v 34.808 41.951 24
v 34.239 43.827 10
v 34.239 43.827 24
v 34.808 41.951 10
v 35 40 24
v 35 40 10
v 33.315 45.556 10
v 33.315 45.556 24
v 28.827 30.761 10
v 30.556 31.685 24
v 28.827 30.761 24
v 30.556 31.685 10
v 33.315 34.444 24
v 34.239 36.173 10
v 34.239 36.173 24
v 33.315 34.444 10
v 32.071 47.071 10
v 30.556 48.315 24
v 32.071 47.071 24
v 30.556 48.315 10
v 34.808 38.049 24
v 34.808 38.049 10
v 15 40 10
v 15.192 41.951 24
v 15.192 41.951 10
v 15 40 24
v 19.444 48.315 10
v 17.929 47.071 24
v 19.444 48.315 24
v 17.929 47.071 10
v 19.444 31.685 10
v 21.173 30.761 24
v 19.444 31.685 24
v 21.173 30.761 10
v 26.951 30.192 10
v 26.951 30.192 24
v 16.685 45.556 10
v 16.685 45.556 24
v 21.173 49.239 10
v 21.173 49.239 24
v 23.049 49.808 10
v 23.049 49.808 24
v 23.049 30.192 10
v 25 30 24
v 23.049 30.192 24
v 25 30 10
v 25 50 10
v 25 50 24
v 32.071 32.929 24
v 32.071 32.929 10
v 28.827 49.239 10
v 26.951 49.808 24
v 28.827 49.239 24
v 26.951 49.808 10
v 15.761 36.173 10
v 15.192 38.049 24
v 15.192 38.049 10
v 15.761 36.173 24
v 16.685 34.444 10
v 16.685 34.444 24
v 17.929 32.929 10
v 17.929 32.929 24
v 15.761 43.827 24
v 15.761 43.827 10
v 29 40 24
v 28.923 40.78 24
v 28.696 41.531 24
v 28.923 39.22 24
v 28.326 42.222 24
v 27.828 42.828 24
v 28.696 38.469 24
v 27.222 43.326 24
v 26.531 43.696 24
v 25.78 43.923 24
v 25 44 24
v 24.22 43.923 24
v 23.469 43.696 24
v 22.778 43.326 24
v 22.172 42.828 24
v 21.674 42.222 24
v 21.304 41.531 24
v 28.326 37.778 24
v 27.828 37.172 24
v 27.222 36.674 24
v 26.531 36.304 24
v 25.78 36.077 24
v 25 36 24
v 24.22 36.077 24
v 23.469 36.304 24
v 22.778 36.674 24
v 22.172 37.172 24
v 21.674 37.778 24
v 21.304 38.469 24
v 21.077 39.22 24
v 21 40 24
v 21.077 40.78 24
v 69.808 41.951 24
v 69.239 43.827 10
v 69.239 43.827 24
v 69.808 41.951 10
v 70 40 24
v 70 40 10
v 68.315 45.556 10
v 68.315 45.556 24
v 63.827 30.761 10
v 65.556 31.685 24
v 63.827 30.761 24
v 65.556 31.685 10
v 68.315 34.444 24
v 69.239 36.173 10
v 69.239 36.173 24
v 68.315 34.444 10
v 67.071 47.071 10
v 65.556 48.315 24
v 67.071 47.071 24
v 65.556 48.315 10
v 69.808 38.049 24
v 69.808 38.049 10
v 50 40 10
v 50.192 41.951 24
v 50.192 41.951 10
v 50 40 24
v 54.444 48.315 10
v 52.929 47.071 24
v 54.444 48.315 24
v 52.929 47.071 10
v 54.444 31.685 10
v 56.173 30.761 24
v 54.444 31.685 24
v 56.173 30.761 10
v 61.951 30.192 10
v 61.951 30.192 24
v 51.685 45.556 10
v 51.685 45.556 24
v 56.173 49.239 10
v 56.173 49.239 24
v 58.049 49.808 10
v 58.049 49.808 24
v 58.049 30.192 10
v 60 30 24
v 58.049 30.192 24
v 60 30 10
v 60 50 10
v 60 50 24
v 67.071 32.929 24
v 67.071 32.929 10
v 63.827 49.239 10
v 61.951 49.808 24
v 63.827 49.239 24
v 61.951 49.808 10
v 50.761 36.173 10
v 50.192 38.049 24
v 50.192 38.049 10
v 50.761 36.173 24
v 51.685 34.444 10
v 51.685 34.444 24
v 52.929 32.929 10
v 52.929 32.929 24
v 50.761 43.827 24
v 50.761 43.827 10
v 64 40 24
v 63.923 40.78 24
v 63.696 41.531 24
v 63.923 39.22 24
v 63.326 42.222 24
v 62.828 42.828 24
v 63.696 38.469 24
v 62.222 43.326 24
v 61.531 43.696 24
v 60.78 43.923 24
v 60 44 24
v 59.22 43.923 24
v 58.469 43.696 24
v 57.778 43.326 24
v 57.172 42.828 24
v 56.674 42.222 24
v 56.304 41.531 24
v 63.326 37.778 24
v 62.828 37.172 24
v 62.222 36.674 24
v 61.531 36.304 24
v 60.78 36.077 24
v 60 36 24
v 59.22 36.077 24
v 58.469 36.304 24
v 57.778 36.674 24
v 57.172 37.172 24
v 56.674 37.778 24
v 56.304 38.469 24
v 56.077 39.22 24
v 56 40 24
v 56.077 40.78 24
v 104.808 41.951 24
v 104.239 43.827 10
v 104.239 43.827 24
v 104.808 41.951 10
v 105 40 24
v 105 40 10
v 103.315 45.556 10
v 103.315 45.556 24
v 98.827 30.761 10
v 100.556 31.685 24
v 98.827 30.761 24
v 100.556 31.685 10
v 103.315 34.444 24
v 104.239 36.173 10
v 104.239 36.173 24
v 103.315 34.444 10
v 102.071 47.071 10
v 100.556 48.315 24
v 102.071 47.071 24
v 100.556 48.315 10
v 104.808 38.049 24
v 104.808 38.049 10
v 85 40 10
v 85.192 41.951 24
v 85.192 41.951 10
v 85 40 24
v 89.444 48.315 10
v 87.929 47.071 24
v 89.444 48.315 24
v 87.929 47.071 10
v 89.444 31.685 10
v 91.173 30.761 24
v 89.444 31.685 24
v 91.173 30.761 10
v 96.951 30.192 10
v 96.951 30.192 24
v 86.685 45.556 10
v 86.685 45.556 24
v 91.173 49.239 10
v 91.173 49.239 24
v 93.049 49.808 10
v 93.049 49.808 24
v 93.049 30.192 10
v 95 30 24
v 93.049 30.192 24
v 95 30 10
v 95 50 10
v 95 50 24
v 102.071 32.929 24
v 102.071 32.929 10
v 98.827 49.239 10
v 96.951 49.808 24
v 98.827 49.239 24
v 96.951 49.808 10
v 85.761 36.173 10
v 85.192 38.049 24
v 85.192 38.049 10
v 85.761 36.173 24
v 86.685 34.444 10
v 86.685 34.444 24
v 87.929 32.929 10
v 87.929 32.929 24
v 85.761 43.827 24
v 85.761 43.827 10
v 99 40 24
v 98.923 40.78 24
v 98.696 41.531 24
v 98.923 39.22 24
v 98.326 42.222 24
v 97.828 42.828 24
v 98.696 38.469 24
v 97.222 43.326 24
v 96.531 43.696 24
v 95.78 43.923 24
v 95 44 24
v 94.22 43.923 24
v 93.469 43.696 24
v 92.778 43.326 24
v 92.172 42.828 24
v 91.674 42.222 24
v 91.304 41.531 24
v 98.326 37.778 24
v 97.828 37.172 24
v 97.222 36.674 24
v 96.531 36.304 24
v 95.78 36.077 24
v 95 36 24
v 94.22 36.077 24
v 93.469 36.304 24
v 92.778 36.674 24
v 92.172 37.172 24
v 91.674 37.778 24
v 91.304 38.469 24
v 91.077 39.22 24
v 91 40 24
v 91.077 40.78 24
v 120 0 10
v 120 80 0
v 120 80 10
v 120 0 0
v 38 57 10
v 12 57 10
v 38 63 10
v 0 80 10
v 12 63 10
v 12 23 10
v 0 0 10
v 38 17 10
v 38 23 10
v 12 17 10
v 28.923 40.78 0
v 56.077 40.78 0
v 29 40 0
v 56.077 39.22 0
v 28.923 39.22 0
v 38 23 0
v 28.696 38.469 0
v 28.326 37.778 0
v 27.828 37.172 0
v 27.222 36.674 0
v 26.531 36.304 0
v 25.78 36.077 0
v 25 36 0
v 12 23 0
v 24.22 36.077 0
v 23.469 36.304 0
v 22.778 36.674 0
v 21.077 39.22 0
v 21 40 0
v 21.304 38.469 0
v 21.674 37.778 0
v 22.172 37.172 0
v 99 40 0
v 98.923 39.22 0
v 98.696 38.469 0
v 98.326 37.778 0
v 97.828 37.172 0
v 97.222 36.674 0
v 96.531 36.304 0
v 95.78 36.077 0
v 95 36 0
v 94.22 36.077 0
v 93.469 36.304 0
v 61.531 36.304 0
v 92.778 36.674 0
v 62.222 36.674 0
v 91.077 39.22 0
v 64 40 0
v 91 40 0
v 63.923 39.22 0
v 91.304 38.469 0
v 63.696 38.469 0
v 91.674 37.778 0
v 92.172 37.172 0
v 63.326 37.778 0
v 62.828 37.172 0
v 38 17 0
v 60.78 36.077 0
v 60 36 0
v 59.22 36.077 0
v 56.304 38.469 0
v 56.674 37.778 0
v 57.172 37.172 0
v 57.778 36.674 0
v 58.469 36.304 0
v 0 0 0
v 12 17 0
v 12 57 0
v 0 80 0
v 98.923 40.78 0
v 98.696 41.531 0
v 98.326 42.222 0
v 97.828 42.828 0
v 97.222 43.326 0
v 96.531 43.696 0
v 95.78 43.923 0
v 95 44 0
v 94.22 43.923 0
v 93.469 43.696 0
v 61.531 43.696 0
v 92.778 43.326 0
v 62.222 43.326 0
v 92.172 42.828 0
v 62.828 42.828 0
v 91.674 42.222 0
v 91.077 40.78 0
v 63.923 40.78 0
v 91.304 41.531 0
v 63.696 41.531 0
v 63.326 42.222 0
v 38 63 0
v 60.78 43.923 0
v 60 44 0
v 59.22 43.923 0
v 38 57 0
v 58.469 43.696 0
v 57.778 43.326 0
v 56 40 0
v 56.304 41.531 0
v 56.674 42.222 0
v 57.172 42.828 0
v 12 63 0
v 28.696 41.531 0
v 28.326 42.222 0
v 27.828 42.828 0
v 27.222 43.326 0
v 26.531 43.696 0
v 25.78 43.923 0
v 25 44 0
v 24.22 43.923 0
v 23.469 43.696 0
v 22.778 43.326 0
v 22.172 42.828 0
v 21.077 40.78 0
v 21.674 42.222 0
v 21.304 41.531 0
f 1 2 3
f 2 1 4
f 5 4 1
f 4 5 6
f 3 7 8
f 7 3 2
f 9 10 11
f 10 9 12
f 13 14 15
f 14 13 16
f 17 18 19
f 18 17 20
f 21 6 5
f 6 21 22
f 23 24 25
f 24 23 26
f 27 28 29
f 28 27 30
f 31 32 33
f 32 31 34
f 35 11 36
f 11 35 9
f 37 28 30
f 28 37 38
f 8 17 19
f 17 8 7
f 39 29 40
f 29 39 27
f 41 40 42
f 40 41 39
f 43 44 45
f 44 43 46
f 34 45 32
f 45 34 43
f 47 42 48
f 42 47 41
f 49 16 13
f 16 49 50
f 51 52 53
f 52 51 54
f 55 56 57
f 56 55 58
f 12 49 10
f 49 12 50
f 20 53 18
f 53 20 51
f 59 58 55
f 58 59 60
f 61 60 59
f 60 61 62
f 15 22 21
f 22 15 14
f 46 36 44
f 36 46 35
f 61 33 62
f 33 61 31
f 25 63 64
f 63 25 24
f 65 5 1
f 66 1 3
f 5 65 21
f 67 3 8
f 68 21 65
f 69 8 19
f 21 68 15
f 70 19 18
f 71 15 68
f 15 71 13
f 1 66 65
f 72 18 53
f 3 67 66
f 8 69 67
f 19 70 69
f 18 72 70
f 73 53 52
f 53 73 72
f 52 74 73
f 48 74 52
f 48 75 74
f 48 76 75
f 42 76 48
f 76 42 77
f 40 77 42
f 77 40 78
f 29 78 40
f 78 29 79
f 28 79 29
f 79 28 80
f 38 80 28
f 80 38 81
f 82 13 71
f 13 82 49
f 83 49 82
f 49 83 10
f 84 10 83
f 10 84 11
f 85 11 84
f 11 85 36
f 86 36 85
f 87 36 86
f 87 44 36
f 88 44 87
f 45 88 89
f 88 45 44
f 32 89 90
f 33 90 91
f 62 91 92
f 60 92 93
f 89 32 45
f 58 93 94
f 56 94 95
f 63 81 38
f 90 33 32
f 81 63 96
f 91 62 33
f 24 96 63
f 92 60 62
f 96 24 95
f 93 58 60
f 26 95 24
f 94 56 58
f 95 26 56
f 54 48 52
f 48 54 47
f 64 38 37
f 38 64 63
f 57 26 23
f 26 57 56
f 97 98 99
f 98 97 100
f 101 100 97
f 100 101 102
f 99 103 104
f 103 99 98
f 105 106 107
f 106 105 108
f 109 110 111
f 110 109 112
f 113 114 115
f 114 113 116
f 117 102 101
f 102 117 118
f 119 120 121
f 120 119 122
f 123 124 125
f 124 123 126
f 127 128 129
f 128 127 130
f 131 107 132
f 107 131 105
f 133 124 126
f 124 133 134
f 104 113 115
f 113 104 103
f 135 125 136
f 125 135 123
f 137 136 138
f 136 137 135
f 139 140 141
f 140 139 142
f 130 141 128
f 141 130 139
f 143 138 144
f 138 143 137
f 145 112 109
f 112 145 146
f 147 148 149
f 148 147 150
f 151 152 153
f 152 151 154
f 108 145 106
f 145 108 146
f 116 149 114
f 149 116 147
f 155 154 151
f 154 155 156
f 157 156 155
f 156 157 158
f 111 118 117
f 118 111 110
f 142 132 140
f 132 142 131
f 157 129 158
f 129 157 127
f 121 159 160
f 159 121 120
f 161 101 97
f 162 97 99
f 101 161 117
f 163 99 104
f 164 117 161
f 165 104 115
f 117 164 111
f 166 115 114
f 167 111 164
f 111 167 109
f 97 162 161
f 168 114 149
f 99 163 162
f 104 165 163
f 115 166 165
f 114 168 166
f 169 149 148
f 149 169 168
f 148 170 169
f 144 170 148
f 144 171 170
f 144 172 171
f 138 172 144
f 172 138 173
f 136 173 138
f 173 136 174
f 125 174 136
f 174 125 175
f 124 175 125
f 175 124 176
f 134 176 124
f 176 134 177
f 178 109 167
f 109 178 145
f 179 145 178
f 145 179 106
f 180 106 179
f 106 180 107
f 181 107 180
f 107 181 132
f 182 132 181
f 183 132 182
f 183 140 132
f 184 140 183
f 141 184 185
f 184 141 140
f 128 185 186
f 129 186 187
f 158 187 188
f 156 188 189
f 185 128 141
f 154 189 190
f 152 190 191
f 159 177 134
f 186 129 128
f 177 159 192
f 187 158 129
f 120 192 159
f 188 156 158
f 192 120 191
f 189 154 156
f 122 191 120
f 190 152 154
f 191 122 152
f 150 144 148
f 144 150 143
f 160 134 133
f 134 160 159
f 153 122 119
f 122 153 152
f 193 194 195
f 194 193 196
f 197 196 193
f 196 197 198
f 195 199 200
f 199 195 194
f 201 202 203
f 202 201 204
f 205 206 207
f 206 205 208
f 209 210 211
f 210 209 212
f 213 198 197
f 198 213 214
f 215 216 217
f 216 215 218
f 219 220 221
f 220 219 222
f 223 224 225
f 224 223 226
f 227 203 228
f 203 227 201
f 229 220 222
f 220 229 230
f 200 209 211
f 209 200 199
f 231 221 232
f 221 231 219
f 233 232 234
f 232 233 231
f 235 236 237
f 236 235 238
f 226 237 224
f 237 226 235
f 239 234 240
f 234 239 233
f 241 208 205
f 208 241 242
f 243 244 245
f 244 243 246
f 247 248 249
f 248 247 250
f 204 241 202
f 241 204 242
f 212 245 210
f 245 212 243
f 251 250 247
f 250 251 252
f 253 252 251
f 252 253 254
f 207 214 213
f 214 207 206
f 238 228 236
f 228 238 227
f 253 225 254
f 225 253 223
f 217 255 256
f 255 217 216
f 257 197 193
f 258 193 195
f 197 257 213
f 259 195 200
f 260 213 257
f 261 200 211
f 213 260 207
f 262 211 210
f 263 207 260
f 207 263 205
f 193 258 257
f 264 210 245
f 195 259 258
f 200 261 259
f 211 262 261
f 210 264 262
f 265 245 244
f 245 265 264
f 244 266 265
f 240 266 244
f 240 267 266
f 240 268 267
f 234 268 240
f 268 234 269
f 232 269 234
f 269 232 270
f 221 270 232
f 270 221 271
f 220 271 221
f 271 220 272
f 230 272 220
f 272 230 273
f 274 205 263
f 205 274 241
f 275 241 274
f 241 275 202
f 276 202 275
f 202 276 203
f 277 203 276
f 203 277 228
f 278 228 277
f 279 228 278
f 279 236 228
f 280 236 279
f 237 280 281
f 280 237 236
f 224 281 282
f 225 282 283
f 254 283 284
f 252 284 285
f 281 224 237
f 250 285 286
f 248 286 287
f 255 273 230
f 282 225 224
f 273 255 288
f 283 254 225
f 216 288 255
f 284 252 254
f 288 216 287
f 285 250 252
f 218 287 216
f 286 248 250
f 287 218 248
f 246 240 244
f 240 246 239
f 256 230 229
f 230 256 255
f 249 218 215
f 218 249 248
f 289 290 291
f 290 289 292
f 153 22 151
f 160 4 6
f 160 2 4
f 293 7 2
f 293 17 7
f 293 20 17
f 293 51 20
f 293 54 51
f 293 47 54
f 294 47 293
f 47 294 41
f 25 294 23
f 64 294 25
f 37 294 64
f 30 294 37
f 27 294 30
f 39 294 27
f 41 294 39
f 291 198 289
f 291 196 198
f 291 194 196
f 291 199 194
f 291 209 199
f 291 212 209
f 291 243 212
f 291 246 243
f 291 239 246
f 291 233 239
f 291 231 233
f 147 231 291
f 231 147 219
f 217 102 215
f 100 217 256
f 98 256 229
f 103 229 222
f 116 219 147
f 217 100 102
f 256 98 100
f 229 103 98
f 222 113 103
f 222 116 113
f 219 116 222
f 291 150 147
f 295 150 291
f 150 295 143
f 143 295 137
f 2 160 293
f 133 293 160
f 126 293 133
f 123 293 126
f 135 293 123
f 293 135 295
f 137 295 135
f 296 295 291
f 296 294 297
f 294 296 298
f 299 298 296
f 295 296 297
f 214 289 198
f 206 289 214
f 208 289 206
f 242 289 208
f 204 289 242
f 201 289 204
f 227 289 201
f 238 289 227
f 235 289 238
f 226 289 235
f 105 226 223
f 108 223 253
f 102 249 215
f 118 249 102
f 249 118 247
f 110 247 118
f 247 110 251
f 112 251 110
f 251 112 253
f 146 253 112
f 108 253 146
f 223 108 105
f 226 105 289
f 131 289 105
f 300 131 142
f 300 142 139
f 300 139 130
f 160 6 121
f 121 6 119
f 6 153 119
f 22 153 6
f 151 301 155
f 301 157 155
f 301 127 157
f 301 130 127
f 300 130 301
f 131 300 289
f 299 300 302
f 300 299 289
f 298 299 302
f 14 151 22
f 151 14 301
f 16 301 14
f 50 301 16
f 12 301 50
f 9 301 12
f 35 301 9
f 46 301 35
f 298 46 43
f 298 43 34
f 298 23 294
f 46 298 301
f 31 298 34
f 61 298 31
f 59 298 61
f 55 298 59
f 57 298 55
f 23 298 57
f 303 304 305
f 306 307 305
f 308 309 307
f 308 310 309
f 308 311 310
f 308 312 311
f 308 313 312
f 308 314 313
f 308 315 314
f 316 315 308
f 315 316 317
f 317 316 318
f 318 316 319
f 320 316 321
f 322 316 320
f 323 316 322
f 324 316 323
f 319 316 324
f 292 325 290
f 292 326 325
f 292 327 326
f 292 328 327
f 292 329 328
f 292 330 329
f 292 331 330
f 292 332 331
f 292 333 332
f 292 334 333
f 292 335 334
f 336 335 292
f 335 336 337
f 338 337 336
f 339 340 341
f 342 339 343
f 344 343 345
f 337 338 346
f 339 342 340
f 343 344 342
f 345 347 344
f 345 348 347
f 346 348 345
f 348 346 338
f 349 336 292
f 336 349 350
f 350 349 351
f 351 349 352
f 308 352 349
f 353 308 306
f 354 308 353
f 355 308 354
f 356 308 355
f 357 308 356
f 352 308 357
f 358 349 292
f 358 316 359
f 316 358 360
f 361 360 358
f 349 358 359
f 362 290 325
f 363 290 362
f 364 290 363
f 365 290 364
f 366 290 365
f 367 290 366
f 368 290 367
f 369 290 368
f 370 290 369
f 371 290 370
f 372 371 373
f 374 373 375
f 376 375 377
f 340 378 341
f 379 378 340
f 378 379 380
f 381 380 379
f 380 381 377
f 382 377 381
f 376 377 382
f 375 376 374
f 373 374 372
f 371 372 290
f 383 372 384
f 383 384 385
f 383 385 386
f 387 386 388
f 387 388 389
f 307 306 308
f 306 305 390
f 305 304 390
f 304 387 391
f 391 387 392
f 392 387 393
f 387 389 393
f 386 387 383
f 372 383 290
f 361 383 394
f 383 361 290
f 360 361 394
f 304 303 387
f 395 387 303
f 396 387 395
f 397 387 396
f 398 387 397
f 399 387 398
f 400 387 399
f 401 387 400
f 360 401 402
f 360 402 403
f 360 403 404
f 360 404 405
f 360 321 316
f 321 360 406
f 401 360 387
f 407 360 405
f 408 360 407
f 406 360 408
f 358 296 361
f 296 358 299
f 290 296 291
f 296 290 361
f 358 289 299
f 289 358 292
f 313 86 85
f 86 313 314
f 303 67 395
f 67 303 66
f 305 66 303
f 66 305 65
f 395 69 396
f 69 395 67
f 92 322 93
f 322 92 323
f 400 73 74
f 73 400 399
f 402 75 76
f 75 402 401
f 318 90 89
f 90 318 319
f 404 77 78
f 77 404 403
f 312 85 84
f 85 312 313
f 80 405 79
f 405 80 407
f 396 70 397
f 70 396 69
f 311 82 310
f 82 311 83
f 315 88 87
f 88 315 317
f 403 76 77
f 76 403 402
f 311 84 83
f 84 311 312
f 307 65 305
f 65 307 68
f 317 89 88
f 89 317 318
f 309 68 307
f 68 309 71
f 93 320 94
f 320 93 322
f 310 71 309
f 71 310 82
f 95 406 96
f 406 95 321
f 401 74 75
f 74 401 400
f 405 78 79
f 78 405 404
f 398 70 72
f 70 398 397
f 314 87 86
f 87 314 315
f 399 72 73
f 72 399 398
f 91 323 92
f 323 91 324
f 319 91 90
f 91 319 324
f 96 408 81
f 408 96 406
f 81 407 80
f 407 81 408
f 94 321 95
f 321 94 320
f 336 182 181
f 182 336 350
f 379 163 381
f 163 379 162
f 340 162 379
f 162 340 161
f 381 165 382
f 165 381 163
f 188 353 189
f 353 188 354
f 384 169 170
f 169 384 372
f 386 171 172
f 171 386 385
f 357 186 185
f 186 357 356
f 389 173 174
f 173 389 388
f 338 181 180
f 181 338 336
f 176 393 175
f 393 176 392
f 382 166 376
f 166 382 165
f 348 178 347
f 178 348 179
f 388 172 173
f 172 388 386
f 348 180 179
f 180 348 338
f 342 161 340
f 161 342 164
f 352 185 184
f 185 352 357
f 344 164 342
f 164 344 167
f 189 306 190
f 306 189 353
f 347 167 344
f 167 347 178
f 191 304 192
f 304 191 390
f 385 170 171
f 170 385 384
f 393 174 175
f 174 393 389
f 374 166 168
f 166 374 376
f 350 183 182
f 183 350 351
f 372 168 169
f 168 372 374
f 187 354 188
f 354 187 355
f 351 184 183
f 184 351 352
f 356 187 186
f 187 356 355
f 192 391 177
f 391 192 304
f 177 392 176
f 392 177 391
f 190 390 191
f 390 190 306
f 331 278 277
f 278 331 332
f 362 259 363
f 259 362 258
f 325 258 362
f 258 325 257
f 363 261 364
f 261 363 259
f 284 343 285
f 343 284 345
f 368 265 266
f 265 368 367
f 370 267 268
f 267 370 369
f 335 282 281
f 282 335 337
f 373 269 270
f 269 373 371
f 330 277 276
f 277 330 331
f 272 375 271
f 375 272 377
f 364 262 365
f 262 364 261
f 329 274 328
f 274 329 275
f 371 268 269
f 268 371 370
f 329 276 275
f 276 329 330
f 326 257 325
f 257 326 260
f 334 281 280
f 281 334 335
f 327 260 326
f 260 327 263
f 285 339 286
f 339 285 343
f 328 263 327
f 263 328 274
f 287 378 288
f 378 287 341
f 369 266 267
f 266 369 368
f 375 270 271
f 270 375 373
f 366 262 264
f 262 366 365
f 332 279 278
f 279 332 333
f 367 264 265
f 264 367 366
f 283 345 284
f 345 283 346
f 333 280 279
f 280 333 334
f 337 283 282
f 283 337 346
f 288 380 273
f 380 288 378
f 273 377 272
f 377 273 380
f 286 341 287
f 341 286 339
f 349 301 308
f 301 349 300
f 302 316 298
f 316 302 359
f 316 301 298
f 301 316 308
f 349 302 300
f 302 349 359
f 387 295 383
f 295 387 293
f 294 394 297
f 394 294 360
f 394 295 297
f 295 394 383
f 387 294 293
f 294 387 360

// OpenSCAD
$fn = 32;

// ----------------------------------------------------------------------
// Drill jig: three_boss_slot jig
// ----------------------------------------------------------------------

// --- parameters (mm) ---
plate_l = 120;            // plate length, X
plate_w = 80;             // plate width, Y
plate_t = 10;             // plate thickness
boss_d = 20;              // guide boss diameter
boss_h = 15;              // boss height above the plate
guide_d = 8;              // guide hole diameter
boss_pitch = 35;          // boss pitch
slot_w = 6;               // clamp slot width
slot_l = 26;              // clamp slot length
slot_x = 12;              // slot start X

n_boss = 3;  // guide bosses
boss_x0 = (plate_l - (n_boss - 1) * boss_pitch) / 2;  // first boss X
boss_top = plate_t - 1 + boss_h;  // boss crown height
total_h = boss_top;  // overall height

difference() {
  union() {
  cube([plate_l, plate_w, plate_t]);
  for (i = [0 : n_boss - 1])
    translate([boss_x0 + i * boss_pitch, plate_w / 2, plate_t - 1])
      cylinder(h = boss_h, d = boss_d);
  }
  for (i = [0 : n_boss - 1])
    translate([boss_x0 + i * boss_pitch, plate_w / 2, -1])
      cylinder(h = plate_t + boss_h, d = guide_d);
  for (cy = [plate_w * 0.25, plate_w * 0.75])
    translate([slot_x, cy - slot_w / 2, -1])
      cube([slot_l, slot_w, plate_t + 2]);
}
